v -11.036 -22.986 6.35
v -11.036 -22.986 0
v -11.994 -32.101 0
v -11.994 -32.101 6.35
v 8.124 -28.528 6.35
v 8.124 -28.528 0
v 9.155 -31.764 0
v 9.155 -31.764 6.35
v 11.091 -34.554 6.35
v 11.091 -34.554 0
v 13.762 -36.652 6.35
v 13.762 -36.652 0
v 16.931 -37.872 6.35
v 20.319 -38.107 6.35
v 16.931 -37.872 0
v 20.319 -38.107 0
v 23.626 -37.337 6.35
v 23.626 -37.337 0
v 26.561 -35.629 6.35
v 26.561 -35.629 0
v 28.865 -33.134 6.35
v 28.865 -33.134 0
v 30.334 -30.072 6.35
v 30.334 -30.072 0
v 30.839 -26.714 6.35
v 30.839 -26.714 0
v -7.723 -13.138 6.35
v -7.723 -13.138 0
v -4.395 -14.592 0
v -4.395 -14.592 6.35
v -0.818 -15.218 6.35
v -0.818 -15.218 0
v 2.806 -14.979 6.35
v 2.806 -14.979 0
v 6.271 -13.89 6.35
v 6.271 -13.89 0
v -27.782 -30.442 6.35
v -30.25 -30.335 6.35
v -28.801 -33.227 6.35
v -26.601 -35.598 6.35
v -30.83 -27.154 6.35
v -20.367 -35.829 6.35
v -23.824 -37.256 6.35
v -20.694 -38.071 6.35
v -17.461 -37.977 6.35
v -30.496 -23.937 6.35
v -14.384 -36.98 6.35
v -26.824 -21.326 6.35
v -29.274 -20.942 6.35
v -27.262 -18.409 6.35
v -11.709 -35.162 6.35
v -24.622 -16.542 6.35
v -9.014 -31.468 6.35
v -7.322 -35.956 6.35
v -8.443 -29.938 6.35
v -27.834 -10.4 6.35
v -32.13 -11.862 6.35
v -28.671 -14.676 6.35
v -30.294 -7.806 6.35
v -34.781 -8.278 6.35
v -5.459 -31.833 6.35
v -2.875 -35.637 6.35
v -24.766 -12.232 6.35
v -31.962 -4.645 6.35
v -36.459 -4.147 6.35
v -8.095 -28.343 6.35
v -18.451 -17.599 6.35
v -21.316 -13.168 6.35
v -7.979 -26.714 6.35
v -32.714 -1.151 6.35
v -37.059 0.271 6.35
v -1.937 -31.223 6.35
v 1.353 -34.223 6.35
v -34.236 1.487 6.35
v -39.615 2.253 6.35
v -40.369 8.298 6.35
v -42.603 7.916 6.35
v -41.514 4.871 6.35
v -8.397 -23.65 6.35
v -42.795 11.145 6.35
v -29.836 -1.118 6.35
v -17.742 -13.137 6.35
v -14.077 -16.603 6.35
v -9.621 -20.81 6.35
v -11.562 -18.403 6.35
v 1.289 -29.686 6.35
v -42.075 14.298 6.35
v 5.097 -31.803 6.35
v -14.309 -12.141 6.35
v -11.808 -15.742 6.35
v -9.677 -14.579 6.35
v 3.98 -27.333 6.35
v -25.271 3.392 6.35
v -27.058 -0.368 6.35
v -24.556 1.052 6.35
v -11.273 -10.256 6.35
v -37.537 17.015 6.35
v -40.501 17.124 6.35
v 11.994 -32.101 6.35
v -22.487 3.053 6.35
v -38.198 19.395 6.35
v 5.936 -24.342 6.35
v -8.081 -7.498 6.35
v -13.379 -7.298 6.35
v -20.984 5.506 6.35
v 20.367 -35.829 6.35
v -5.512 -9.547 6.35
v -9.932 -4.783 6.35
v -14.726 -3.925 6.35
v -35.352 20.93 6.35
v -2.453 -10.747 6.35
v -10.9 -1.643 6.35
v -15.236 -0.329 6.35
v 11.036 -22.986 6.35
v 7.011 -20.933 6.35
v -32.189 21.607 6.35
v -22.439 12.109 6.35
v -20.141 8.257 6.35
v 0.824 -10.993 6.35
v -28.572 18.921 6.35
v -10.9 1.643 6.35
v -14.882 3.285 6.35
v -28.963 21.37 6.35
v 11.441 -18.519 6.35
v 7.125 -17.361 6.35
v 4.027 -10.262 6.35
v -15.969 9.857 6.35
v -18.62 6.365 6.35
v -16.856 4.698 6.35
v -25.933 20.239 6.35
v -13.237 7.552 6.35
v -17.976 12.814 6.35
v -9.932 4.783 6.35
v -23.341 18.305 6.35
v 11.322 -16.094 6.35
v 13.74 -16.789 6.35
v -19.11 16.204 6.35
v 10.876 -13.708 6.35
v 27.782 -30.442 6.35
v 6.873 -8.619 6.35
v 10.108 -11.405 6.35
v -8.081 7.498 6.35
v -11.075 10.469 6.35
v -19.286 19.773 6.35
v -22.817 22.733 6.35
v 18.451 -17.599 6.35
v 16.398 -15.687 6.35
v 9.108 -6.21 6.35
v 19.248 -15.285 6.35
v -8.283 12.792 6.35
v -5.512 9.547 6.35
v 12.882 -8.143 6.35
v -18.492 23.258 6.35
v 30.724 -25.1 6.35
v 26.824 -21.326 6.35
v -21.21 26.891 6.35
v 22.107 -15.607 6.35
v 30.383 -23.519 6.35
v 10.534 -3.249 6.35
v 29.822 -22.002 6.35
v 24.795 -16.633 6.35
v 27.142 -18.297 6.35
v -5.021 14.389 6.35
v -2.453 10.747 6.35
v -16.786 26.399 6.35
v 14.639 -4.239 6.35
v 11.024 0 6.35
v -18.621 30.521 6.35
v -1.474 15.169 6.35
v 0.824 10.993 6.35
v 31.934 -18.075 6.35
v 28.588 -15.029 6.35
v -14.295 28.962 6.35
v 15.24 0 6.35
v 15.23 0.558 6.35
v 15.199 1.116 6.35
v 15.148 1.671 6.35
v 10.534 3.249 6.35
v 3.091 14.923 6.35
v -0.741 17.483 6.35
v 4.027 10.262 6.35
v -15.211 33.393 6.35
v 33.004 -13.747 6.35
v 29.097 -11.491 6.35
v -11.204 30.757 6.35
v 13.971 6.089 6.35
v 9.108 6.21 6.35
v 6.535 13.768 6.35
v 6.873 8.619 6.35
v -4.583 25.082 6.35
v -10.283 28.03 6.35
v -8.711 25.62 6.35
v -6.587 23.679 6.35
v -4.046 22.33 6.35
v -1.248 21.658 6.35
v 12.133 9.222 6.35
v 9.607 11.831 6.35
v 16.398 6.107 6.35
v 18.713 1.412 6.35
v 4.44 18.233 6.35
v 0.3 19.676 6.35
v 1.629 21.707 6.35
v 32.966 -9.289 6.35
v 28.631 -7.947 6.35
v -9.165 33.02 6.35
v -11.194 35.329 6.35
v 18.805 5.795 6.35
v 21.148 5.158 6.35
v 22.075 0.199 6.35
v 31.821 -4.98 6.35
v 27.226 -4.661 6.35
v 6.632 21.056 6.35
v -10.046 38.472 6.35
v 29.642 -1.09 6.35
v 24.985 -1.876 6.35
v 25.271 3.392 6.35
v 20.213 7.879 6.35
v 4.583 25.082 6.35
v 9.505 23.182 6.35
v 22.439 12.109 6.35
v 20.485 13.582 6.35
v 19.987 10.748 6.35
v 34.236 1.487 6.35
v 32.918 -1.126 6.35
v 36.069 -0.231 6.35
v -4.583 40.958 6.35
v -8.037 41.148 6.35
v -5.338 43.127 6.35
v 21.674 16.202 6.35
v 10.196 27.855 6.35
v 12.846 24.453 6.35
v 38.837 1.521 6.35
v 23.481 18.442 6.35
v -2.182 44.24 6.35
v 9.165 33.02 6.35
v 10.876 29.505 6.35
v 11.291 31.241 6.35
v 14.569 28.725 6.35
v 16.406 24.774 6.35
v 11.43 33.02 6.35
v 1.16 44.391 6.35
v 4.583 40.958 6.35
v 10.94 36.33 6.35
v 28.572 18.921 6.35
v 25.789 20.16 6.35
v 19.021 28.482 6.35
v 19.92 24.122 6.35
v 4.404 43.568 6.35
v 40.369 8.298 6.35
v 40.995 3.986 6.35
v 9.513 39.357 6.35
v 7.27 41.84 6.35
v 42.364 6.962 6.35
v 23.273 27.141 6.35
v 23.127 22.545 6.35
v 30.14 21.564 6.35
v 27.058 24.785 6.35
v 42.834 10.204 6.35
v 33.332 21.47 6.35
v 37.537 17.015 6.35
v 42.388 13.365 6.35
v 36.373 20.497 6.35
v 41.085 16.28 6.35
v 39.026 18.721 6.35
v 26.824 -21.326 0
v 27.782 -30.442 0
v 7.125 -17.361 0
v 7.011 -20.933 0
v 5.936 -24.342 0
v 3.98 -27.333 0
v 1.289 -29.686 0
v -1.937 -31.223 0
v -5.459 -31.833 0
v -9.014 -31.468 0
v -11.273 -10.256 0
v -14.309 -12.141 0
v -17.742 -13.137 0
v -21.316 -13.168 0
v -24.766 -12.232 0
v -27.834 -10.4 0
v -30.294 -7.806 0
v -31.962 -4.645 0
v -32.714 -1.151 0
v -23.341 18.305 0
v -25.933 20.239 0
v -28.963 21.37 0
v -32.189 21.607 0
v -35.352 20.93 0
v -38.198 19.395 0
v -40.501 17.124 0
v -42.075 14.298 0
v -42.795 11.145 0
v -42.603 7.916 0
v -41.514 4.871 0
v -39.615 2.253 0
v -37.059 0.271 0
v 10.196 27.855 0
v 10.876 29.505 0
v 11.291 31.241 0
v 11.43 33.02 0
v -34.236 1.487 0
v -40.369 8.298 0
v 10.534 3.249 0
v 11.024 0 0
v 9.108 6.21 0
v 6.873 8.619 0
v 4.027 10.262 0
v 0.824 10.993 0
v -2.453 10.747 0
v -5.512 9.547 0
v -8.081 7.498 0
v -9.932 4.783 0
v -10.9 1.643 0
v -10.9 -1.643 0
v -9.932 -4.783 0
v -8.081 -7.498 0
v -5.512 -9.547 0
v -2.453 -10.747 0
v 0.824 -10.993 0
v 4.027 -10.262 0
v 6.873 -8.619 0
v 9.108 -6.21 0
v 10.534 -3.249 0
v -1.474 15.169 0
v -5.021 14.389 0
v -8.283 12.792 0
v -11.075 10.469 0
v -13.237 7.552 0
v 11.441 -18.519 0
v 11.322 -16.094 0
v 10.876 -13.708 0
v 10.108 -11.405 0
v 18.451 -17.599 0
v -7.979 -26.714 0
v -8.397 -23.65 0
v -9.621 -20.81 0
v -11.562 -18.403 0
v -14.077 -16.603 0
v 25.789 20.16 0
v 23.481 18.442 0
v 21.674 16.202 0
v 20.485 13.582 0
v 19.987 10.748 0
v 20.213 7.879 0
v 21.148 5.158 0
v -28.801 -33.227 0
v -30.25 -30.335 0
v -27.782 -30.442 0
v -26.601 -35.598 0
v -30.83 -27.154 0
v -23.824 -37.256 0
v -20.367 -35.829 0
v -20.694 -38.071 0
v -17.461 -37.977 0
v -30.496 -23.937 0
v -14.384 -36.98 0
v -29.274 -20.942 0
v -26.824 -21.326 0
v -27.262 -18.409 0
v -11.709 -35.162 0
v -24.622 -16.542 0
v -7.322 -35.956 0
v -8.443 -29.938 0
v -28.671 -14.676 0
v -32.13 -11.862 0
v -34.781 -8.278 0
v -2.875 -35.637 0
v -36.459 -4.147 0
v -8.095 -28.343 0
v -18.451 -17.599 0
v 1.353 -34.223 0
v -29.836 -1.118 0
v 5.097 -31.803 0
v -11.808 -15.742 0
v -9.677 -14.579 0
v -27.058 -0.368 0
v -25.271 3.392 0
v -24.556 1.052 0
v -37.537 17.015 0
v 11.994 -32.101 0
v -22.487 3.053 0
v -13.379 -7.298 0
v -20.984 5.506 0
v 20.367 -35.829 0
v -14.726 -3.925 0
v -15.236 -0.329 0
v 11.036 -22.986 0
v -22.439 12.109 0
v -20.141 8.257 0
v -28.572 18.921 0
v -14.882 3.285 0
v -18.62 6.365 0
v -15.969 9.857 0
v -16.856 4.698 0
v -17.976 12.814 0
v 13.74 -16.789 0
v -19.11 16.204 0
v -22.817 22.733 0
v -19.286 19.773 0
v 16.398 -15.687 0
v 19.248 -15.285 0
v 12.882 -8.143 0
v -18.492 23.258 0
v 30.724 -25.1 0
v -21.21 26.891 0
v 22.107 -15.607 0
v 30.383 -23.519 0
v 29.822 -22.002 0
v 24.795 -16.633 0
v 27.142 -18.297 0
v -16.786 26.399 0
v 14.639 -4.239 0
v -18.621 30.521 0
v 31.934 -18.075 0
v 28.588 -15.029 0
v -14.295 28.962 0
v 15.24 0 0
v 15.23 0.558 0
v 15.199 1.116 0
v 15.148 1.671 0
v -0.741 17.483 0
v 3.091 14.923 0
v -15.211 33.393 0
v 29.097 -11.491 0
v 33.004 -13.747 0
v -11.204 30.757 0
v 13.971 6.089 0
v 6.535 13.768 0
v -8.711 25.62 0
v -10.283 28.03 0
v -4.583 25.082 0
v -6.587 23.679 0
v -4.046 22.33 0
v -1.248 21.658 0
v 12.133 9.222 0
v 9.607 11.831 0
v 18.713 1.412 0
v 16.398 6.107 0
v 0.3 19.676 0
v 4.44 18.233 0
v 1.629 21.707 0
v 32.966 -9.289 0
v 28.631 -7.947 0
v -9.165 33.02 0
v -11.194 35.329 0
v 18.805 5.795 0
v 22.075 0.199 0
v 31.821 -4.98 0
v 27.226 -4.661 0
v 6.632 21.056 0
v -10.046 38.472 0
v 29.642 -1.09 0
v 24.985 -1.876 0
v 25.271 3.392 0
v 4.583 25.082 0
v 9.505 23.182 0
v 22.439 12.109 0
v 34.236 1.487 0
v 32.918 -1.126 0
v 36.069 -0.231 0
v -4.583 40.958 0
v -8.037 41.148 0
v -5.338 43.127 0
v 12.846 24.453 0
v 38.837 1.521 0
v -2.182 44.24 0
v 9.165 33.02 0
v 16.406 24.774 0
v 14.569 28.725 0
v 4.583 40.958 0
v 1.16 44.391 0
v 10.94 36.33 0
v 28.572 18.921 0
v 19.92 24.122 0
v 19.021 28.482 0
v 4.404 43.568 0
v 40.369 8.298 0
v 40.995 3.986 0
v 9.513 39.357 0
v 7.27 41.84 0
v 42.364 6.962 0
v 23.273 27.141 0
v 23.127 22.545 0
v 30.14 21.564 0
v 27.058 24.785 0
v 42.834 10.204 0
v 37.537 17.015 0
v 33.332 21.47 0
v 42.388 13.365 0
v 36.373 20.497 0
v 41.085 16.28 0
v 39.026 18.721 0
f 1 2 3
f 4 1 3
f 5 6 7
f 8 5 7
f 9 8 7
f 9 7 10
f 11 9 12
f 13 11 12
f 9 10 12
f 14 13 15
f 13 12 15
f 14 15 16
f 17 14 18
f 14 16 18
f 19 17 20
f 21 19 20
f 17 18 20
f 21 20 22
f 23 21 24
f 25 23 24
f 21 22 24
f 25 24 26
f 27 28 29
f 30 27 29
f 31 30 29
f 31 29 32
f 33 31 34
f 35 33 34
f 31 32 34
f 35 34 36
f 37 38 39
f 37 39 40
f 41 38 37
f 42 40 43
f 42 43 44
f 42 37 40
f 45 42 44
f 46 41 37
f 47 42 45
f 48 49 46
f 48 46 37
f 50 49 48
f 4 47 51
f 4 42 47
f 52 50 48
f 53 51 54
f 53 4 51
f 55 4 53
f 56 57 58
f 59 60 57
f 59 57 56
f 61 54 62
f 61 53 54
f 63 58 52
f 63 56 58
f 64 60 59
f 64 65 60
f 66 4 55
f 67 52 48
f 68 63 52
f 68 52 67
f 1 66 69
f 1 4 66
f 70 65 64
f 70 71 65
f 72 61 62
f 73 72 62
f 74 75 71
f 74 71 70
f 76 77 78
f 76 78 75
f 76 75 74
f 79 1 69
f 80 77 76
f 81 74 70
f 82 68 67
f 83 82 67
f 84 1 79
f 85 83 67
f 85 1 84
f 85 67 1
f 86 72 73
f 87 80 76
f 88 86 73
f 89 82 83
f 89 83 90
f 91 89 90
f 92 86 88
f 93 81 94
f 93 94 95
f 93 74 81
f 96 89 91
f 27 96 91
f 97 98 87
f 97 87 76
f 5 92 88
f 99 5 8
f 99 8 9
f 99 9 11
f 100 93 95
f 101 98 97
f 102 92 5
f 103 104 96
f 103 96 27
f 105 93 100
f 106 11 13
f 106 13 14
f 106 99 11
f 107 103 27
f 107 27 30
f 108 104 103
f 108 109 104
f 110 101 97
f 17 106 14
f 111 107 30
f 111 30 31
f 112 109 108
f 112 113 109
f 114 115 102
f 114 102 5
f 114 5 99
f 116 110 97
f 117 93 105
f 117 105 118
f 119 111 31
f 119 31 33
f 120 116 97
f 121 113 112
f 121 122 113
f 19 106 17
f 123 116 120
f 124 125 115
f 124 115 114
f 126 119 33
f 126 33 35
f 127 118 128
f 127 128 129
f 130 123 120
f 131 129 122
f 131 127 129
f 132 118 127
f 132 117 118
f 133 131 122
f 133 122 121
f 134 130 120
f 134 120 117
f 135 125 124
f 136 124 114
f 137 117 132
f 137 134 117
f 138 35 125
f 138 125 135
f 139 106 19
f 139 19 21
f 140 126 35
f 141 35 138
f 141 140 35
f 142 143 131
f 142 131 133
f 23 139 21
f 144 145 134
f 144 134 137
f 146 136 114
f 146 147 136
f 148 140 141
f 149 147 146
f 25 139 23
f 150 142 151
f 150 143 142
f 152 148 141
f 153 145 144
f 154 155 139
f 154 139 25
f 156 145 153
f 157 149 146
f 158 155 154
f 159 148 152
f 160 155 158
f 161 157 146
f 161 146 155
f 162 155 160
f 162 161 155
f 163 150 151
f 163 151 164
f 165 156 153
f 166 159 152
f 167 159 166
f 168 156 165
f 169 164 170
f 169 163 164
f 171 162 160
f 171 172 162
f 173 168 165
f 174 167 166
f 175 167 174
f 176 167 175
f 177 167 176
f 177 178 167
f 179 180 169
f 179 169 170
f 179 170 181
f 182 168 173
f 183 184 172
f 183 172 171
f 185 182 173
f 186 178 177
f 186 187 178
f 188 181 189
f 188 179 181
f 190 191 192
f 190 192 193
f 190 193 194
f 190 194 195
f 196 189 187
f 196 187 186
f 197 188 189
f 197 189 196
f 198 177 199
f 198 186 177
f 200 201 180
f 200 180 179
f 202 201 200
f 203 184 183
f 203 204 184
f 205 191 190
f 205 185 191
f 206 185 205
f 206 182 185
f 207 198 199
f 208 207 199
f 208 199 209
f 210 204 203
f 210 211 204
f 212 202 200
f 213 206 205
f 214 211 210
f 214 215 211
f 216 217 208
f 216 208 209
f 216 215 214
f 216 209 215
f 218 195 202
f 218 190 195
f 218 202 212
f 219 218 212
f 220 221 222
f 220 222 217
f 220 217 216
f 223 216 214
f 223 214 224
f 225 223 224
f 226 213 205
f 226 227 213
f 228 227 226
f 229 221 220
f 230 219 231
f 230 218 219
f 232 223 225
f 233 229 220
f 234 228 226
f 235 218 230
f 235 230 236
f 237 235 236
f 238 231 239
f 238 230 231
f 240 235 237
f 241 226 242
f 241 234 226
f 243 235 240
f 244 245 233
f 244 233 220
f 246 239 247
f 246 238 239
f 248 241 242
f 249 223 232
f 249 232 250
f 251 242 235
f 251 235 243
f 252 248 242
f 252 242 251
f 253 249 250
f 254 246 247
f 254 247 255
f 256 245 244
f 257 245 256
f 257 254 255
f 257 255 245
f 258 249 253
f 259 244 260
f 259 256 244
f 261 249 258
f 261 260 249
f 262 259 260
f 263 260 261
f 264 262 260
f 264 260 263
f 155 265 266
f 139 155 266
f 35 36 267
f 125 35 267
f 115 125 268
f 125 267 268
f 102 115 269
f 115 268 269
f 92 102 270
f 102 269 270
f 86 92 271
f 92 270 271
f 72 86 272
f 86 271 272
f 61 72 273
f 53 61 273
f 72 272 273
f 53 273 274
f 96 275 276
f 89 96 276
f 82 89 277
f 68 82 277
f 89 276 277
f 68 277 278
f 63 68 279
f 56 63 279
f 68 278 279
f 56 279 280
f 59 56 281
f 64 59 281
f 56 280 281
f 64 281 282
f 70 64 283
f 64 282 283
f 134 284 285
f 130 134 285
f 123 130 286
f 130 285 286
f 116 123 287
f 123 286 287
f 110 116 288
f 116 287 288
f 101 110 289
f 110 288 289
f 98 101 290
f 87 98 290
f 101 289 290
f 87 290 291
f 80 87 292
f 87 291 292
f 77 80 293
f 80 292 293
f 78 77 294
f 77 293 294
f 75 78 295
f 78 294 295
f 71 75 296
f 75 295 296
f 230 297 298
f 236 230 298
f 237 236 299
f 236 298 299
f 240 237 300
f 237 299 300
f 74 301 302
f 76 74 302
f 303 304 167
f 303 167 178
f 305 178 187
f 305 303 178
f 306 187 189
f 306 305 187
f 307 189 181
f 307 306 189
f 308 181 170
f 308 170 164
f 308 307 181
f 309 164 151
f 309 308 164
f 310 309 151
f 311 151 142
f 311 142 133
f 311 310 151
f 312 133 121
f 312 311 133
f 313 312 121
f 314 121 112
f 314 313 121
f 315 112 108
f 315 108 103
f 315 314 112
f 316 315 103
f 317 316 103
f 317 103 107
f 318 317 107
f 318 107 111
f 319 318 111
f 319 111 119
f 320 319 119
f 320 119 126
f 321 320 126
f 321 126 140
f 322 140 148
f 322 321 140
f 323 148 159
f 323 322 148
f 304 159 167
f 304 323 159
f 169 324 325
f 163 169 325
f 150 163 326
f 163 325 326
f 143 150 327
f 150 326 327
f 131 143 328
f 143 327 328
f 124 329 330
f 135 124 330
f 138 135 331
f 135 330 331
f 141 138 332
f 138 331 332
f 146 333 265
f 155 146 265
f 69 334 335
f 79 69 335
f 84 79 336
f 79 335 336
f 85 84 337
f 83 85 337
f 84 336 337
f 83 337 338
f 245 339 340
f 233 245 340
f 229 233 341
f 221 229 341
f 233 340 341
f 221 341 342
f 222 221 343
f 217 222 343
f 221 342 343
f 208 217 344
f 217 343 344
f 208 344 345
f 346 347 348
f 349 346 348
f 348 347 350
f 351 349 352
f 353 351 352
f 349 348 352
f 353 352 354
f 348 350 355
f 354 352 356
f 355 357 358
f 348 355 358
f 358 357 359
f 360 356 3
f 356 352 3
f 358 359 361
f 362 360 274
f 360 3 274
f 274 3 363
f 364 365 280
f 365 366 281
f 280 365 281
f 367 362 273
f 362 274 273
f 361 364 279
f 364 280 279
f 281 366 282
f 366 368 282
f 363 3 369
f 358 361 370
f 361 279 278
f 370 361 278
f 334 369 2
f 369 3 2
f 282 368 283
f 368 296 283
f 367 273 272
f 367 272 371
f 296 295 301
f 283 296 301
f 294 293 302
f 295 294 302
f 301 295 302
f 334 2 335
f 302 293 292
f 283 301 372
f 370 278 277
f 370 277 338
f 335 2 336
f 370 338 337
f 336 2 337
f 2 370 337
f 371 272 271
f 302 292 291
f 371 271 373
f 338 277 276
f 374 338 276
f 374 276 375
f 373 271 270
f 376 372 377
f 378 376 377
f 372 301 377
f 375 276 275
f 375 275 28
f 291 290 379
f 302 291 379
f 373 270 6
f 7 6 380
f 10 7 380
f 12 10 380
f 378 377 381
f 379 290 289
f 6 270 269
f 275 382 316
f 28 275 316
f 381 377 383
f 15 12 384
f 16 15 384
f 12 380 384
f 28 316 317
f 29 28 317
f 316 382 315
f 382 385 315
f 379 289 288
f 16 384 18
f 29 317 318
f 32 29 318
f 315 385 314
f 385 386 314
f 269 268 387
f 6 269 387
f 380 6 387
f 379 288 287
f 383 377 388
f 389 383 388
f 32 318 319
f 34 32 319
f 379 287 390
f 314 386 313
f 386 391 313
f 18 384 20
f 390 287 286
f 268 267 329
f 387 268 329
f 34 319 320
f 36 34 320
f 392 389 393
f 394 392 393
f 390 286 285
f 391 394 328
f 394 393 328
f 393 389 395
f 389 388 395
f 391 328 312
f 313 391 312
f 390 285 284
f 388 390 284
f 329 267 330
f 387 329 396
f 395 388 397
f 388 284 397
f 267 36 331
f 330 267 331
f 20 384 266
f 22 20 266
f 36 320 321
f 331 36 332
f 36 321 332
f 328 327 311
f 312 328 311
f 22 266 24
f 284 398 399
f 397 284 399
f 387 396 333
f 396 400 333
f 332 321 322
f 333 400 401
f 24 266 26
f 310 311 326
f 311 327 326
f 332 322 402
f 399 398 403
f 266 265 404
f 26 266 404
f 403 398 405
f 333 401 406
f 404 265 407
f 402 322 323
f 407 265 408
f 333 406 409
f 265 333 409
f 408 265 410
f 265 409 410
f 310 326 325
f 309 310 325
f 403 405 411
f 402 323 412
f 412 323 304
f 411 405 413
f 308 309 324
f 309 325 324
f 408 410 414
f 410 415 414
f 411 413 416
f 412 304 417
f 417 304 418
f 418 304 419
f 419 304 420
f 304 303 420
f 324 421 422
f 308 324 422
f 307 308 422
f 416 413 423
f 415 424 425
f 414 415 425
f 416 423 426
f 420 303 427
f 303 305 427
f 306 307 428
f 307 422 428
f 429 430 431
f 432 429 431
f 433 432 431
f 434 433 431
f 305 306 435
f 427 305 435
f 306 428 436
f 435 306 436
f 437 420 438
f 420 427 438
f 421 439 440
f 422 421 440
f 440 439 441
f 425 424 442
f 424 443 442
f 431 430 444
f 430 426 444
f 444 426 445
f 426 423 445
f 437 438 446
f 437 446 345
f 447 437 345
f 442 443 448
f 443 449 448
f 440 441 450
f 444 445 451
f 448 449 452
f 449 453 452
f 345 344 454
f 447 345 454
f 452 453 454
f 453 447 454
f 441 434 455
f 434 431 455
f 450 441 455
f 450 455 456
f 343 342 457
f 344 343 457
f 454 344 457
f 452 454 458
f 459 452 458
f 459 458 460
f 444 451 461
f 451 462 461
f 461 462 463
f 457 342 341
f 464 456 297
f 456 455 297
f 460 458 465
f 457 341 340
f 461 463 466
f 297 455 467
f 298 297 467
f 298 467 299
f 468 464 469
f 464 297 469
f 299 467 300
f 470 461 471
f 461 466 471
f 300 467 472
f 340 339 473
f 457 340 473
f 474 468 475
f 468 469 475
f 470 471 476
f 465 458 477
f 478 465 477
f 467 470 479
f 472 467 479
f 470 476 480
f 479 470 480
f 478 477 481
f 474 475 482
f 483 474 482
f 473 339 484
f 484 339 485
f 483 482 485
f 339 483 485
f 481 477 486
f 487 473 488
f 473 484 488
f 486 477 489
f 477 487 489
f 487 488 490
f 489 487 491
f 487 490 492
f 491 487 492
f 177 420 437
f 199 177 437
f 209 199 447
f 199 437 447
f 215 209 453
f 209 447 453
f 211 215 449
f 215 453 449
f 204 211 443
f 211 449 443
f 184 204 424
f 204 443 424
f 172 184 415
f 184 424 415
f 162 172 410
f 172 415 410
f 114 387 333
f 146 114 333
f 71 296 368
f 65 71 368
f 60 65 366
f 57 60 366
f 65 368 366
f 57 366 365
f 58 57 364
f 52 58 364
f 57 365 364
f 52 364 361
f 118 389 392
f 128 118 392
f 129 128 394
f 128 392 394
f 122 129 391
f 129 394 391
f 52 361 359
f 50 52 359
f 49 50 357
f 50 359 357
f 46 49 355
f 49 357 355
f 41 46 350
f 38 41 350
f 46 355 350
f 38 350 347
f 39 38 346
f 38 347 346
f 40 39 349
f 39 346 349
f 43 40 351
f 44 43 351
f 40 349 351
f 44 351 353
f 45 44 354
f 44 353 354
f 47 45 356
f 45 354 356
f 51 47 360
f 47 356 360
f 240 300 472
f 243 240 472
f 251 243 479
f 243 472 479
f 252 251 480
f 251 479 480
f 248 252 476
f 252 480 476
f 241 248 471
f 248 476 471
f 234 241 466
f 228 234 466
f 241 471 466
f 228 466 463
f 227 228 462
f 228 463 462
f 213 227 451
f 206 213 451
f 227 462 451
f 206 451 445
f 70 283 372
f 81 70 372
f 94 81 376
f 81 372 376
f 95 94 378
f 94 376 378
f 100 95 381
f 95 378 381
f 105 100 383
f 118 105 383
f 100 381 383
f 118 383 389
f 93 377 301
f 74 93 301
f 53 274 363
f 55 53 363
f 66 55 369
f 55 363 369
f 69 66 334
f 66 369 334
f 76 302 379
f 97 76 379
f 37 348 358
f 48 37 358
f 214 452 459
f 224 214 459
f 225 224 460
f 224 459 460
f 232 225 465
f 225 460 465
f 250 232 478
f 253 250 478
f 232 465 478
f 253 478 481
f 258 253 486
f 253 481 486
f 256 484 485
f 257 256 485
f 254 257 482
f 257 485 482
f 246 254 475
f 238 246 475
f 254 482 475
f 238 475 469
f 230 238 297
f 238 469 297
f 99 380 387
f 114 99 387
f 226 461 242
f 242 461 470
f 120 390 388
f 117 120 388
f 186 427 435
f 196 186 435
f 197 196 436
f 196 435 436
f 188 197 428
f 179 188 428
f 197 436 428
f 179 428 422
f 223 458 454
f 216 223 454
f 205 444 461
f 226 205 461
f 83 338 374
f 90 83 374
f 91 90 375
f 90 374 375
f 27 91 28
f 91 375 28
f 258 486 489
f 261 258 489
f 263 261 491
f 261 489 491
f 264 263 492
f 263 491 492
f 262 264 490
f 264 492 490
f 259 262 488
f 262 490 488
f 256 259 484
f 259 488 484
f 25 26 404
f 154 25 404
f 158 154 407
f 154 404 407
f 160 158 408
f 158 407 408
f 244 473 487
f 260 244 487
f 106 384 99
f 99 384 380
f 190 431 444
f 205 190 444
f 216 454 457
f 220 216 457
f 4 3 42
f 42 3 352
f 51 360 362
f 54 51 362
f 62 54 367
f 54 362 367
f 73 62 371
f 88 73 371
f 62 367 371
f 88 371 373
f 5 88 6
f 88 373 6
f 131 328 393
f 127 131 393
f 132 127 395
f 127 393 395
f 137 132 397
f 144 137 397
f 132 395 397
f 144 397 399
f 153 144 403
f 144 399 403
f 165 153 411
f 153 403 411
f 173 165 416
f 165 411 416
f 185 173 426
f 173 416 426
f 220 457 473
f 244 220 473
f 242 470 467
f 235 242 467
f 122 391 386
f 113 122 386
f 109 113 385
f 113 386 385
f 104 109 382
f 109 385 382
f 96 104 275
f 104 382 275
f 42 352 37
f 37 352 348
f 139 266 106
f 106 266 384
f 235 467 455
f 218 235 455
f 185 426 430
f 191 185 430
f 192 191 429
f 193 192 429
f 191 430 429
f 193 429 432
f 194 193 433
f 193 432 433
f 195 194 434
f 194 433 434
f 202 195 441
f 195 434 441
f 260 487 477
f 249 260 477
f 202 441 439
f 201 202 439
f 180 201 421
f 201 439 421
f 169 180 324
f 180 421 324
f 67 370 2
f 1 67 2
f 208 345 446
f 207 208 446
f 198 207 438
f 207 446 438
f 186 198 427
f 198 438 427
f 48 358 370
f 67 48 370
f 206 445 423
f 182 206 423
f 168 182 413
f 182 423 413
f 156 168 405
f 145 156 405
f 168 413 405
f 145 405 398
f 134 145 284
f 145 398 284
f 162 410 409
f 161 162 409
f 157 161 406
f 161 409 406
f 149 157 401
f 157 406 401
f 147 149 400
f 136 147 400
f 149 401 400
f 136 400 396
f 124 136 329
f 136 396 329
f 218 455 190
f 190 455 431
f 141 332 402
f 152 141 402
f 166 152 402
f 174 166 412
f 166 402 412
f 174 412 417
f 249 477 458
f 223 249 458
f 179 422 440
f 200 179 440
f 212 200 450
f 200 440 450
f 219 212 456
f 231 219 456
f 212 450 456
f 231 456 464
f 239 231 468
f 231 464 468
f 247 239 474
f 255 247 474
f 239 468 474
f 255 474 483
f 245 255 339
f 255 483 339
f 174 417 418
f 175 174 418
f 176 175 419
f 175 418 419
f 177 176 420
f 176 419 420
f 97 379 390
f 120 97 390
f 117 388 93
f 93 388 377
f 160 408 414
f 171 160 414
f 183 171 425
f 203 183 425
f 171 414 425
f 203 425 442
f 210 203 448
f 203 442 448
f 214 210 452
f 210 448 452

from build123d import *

# Parameters (mm, degrees)
F0_R     = 11.0236
F1_DEPTH = 6.35


with BuildPart() as f1:
    # F0 (on Top) → F1 (new body)
    with BuildSketch(Plane.XY):
        with BuildLine():
            ThreePointArc((-37.058964, 0.270715), (-34.958103, -0.659612), (-32.713622, -1.150971))
            ThreePointArc((-32.713622, -1.150971), (-24.555801, 1.052314), (-20.140829, 8.257349))
            ThreePointArc((-20.140829, 8.257349), (-22.501454, 13.038914), (-23.340718, 18.304989))
            ThreePointArc((-23.340718, 18.304989), (-40.501055, 17.123743), (-37.058964, 0.270715))
        make_face()
        Polygon((-40.369035, 8.29814), (-37.53676, 17.014987), (-28.571611, 18.920588), (-22.438737, 12.109342), (-25.271013, 3.392495), (-34.236162, 1.486894), align=None, mode=Mode.SUBTRACT)
        with BuildLine():
            ThreePointArc((-14.881645, 3.285458), (-14.220455, 5.480534), (-13.237485, 7.551595))
            ThreePointArc((-13.237485, 7.551595), (-19.286416, 19.773486), (-11.203704, 30.756834))
            ThreePointArc((-11.203704, 30.756834), (-11.429976, 33.0433), (-11.194384, 35.328824))
            ThreePointArc((-11.194384, 35.328824), (-20.029351, 28.787423), (-23.340718, 18.304989))
            ThreePointArc((-23.340718, 18.304989), (-22.501454, 13.038914), (-20.140829, 8.257349))
            ThreePointArc((-20.140829, 8.257349), (-17.766451, 5.501443), (-14.881645, 3.285458))
        make_face()
        with BuildLine():
            ThreePointArc((-14.077064, -16.603405), (-10.722318, -15.19686), (-7.723338, -13.138023))
            ThreePointArc((-7.723338, -13.138023), (-9.60666, -11.830879), (-11.272602, -10.256025))
            ThreePointArc((-11.272602, -10.256025), (-24.765533, -12.232129), (-32.713622, -1.150971))
            ThreePointArc((-32.713622, -1.150971), (-34.958103, -0.659612), (-37.058964, 0.270715))
            ThreePointArc((-37.058964, 0.270715), (-33.567876, -10.153242), (-24.621757, -16.541789))
            ThreePointArc((-24.621757, -16.541789), (-19.341881, -15.283936), (-14.077064, -16.603405))
        make_face()
        with BuildLine():
            ThreePointArc((-11.709315, -35.161513), (-10.175319, -33.450963), (-9.014427, -31.468173))
            ThreePointArc((-9.014427, -31.468173), (-8.24061, -29.146714), (-7.978669, -26.713741))
            ThreePointArc((-7.978669, -26.713741), (-9.621301, -20.810155), (-14.077064, -16.603405))
            ThreePointArc((-14.077064, -16.603405), (-19.341881, -15.283936), (-24.621757, -16.541789))
            ThreePointArc((-24.621757, -16.541789), (-28.801161, -33.227265), (-11.709315, -35.161513))
        make_face()
        Polygon((-20.366718, -35.828967), (-27.781711, -30.44166), (-26.823662, -21.326433), (-18.45062, -17.598515), (-11.035627, -22.985823), (-11.993676, -32.101049), align=None, mode=Mode.SUBTRACT)
        with BuildLine():
            ThreePointArc((11.440725, -18.518818), (11.139694, -14.893619), (10.10836, -11.405203))
            ThreePointArc((10.10836, -11.405203), (8.283213, -12.792419), (6.270634, -13.890167))
            ThreePointArc((6.270634, -13.890167), (3.980475, -27.333357), (-9.014427, -31.468173))
            ThreePointArc((-9.014427, -31.468173), (-10.175319, -33.450963), (-11.709315, -35.161513))
            ThreePointArc((-11.709315, -35.161513), (-0.716737, -35.062472), (8.123635, -28.528377))
            ThreePointArc((8.123635, -28.528377), (8.558917, -23.118218), (11.440725, -18.518818))
        make_face()
        with BuildLine():
            ThreePointArc((29.822209, -22.001726), (28.669409, -20.01422), (27.1424, -18.297429))
            ThreePointArc((27.1424, -18.297429), (19.247526, -15.284877), (11.440725, -18.518818))
            ThreePointArc((11.440725, -18.518818), (8.558917, -23.118218), (8.123635, -28.528377))
            ThreePointArc((8.123635, -28.528377), (20.318877, -38.107442), (30.838669, -26.713741))
            ThreePointArc((30.838669, -26.713741), (30.581665, -24.30354), (29.822209, -22.001726))
        make_face()
        Polygon((27.781711, -30.44166), (20.366718, -35.828967), (11.993676, -32.101049), (11.035627, -22.985823), (18.45062, -17.598515), (26.823662, -21.326433), align=None, mode=Mode.SUBTRACT)
        with BuildLine():
            ThreePointArc((13.970648, 6.08922), (14.725967, 3.924729), (15.148067, 1.67143))
            ThreePointArc((15.148067, 1.67143), (27.225602, -4.660815), (27.1424, -18.297429))
            ThreePointArc((27.1424, -18.297429), (28.669409, -20.01422), (29.822209, -22.001726))
            ThreePointArc((29.822209, -22.001726), (33.124908, -11.516557), (29.64244, -1.089717))
            ThreePointArc((29.64244, -1.089717), (24.631583, 0.996092), (21.147821, 5.158146))
            ThreePointArc((21.147821, 5.158146), (17.607028, 5.992097), (13.970648, 6.08922))
        make_face()
        with BuildLine():
            ThreePointArc((25.789352, 20.15974), (20.484595, 13.582198), (21.147821, 5.158146))
            ThreePointArc((21.147821, 5.158146), (24.631583, 0.996092), (29.64244, -1.089717))
            ThreePointArc((29.64244, -1.089717), (38.83731, 1.521051), (42.833886, 10.203741))
            ThreePointArc((42.833886, 10.203741), (39.026349, 18.720957), (30.140454, 21.563699))
            ThreePointArc((30.140454, 21.563699), (27.893989, 21.081495), (25.789352, 20.15974))
        make_face()
        Polygon((37.53676, 17.014987), (40.369035, 8.29814), (34.236162, 1.486894), (25.271013, 3.392495), (22.438737, 12.109342), (28.571611, 18.920588), align=None, mode=Mode.SUBTRACT)
        with BuildLine():
            ThreePointArc((-1.474025, 15.168548), (0.817935, 15.218035), (3.091386, 14.923168))
            ThreePointArc((3.091386, 14.923168), (12.845872, 24.452815), (25.789352, 20.15974))
            ThreePointArc((25.789352, 20.15974), (27.893989, 21.081495), (30.140454, 21.563699))
            ThreePointArc((30.140454, 21.563699), (21.189057, 27.944848), (10.196401, 27.854894))
            ThreePointArc((10.196401, 27.854894), (6.664238, 23.733836), (1.629347, 21.706728))
            ThreePointArc((1.629347, 21.706728), (-0.257952, 18.596938), (-1.474025, 15.168548))
        make_face()
        with BuildLine():
            ThreePointArc((-11.203704, 30.756834), (-6.58735, 23.679137), (1.629347, 21.706728))
            ThreePointArc((1.629347, 21.706728), (6.664238, 23.733836), (10.196401, 27.854894))
            ThreePointArc((10.196401, 27.854894), (11.117323, 30.364812), (11.43, 33.02))
            ThreePointArc((11.43, 33.02), (1.160408, 44.390943), (-11.194384, 35.328824))
            ThreePointArc((-11.194384, 35.328824), (-11.429976, 33.0433), (-11.203704, 30.756834))
        make_face()
        Polygon((9.165436, 33.02), (4.582718, 25.0825), (-4.582718, 25.0825), (-9.165436, 33.02), (-4.582718, 40.9575), (4.582718, 40.9575), align=None, mode=Mode.SUBTRACT)
        with BuildLine():
            ThreePointArc((10.10836, -11.405203), (13.898004, -6.253247), (15.24, 0))
            ThreePointArc((15.24, 0), (15.216999, 0.836978), (15.148067, 1.67143))
            ThreePointArc((15.148067, 1.67143), (14.725967, 3.924729), (13.970648, 6.08922))
            ThreePointArc((13.970648, 6.08922), (9.60666, 11.830879), (3.091386, 14.923168))
            ThreePointArc((3.091386, 14.923168), (0.817935, 15.218035), (-1.474025, 15.168548))
            ThreePointArc((-1.474025, 15.168548), (-8.283213, 12.792419), (-13.237485, 7.551595))
            ThreePointArc((-13.237485, 7.551595), (-14.220455, 5.480534), (-14.881645, 3.285458))
            ThreePointArc((-14.881645, 3.285458), (-14.725967, -3.924729), (-11.272602, -10.256025))
            ThreePointArc((-11.272602, -10.256025), (-9.60666, -11.830879), (-7.723338, -13.138023))
            ThreePointArc((-7.723338, -13.138023), (-0.817935, -15.218035), (6.270634, -13.890167))
            ThreePointArc((6.270634, -13.890167), (8.283213, -12.792419), (10.10836, -11.405203))
        make_face()
        Circle(F0_R, mode=Mode.SUBTRACT)
    extrude(amount=F1_DEPTH)


solid = f1.part
